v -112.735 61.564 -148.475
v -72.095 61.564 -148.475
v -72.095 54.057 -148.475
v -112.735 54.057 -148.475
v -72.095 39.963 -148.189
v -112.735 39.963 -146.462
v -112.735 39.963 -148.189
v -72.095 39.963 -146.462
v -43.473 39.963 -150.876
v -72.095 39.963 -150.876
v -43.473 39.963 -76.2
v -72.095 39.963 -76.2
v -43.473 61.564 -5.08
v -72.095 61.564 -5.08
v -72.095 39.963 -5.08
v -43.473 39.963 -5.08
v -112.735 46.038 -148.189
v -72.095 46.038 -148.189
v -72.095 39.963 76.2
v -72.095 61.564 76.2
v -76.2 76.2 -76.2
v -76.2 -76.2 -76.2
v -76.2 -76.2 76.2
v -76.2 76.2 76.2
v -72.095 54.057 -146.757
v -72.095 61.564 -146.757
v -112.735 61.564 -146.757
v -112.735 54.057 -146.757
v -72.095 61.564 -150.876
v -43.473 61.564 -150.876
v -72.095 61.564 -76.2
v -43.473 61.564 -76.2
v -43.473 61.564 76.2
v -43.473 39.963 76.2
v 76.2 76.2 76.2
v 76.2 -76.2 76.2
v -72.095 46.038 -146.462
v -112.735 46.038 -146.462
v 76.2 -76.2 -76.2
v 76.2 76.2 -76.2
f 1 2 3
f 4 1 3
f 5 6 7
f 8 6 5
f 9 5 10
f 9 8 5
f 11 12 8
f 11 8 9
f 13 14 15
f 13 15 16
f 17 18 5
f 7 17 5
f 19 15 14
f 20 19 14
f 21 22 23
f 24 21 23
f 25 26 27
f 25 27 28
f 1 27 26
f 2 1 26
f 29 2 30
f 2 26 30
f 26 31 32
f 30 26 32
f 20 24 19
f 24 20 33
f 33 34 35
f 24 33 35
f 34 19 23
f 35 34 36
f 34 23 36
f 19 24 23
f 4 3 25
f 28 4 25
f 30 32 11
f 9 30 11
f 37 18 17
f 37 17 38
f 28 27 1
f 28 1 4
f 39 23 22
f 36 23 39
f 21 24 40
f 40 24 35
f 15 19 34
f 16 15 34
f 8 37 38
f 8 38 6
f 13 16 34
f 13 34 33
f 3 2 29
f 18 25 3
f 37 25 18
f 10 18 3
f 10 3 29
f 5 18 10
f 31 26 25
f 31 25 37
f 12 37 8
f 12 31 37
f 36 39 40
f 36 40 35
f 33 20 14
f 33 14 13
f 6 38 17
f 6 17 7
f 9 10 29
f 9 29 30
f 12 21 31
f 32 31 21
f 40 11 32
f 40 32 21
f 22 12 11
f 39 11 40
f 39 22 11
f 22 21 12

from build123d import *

# Parameters (mm, degrees)
F1_W       = 152.4
F1_H       = 152.4
F2_DEPTH   = 76.2
F3_W       = 28.6219716072
F3_H       = 21.6014906764
F2_FACE1_W = 152.4
F2_FACE1_H = 152.4
F4_DEPTH   = 81.28
F5_W       = 28.6219716072
F5_H       = 21.6014906764
F6_DEPTH   = 74.676
F7_W       = 7.5074806809
F7_H       = 1.7182230949
F7_W_2     = 6.0756318271
F7_H_2     = 1.7272
F8_DEPTH   = 40.64


# Not quite as in the source:
# - a variable given as a bare number and used for a length is read in inches; the dataset says mm whatever the document's units were


with BuildPart() as f2:
    # F1 (on Front) → F2 (new body, symmetric)
    with BuildSketch(Plane.XZ):
        Rectangle(F1_W, F1_H)
    extrude(amount=F2_DEPTH, both=True)

    # F3 (on face) + F2_face1 (on face) → F4 (cut)
    with BuildSketch(Plane.XY.offset(76.2)):
        with Locations((-57.7839799225, 50.7634989917)):
            Rectangle(F3_W, F3_H)
    with BuildSketch(Plane(origin=(0, 0, -76.2), x_dir=(1, 0, 0), z_dir=(0, 0, -1))):
        Rectangle(F2_FACE1_W, F2_FACE1_H)
    extrude(amount=-F4_DEPTH, dir=(0, 0, 1), mode=Mode.SUBTRACT)

    # F5 (on face) → F6 (join)
    with BuildSketch(Plane(origin=(0, 0, -76.2), x_dir=(1, 0, 0), z_dir=(0, 0, -1))):
        with Locations((-57.7839799225, -50.7634989917)):
            Rectangle(F5_W, F5_H)
    extrude(amount=F6_DEPTH)

    # F7 (on face) → F8 (join)
    with BuildSketch(Plane(origin=(-72.0949657261, 0, 0), x_dir=(0, -1, 0), z_dir=(-1, 0, 0))):
        with Locations((-57.8105039895, -147.6161032915)):
            Rectangle(F7_W, F7_H)
        with Locations((-43.0005695671, -147.3252443232)):
            Rectangle(F7_W_2, F7_H_2)
    extrude(amount=F8_DEPTH)


solid = f2.part
